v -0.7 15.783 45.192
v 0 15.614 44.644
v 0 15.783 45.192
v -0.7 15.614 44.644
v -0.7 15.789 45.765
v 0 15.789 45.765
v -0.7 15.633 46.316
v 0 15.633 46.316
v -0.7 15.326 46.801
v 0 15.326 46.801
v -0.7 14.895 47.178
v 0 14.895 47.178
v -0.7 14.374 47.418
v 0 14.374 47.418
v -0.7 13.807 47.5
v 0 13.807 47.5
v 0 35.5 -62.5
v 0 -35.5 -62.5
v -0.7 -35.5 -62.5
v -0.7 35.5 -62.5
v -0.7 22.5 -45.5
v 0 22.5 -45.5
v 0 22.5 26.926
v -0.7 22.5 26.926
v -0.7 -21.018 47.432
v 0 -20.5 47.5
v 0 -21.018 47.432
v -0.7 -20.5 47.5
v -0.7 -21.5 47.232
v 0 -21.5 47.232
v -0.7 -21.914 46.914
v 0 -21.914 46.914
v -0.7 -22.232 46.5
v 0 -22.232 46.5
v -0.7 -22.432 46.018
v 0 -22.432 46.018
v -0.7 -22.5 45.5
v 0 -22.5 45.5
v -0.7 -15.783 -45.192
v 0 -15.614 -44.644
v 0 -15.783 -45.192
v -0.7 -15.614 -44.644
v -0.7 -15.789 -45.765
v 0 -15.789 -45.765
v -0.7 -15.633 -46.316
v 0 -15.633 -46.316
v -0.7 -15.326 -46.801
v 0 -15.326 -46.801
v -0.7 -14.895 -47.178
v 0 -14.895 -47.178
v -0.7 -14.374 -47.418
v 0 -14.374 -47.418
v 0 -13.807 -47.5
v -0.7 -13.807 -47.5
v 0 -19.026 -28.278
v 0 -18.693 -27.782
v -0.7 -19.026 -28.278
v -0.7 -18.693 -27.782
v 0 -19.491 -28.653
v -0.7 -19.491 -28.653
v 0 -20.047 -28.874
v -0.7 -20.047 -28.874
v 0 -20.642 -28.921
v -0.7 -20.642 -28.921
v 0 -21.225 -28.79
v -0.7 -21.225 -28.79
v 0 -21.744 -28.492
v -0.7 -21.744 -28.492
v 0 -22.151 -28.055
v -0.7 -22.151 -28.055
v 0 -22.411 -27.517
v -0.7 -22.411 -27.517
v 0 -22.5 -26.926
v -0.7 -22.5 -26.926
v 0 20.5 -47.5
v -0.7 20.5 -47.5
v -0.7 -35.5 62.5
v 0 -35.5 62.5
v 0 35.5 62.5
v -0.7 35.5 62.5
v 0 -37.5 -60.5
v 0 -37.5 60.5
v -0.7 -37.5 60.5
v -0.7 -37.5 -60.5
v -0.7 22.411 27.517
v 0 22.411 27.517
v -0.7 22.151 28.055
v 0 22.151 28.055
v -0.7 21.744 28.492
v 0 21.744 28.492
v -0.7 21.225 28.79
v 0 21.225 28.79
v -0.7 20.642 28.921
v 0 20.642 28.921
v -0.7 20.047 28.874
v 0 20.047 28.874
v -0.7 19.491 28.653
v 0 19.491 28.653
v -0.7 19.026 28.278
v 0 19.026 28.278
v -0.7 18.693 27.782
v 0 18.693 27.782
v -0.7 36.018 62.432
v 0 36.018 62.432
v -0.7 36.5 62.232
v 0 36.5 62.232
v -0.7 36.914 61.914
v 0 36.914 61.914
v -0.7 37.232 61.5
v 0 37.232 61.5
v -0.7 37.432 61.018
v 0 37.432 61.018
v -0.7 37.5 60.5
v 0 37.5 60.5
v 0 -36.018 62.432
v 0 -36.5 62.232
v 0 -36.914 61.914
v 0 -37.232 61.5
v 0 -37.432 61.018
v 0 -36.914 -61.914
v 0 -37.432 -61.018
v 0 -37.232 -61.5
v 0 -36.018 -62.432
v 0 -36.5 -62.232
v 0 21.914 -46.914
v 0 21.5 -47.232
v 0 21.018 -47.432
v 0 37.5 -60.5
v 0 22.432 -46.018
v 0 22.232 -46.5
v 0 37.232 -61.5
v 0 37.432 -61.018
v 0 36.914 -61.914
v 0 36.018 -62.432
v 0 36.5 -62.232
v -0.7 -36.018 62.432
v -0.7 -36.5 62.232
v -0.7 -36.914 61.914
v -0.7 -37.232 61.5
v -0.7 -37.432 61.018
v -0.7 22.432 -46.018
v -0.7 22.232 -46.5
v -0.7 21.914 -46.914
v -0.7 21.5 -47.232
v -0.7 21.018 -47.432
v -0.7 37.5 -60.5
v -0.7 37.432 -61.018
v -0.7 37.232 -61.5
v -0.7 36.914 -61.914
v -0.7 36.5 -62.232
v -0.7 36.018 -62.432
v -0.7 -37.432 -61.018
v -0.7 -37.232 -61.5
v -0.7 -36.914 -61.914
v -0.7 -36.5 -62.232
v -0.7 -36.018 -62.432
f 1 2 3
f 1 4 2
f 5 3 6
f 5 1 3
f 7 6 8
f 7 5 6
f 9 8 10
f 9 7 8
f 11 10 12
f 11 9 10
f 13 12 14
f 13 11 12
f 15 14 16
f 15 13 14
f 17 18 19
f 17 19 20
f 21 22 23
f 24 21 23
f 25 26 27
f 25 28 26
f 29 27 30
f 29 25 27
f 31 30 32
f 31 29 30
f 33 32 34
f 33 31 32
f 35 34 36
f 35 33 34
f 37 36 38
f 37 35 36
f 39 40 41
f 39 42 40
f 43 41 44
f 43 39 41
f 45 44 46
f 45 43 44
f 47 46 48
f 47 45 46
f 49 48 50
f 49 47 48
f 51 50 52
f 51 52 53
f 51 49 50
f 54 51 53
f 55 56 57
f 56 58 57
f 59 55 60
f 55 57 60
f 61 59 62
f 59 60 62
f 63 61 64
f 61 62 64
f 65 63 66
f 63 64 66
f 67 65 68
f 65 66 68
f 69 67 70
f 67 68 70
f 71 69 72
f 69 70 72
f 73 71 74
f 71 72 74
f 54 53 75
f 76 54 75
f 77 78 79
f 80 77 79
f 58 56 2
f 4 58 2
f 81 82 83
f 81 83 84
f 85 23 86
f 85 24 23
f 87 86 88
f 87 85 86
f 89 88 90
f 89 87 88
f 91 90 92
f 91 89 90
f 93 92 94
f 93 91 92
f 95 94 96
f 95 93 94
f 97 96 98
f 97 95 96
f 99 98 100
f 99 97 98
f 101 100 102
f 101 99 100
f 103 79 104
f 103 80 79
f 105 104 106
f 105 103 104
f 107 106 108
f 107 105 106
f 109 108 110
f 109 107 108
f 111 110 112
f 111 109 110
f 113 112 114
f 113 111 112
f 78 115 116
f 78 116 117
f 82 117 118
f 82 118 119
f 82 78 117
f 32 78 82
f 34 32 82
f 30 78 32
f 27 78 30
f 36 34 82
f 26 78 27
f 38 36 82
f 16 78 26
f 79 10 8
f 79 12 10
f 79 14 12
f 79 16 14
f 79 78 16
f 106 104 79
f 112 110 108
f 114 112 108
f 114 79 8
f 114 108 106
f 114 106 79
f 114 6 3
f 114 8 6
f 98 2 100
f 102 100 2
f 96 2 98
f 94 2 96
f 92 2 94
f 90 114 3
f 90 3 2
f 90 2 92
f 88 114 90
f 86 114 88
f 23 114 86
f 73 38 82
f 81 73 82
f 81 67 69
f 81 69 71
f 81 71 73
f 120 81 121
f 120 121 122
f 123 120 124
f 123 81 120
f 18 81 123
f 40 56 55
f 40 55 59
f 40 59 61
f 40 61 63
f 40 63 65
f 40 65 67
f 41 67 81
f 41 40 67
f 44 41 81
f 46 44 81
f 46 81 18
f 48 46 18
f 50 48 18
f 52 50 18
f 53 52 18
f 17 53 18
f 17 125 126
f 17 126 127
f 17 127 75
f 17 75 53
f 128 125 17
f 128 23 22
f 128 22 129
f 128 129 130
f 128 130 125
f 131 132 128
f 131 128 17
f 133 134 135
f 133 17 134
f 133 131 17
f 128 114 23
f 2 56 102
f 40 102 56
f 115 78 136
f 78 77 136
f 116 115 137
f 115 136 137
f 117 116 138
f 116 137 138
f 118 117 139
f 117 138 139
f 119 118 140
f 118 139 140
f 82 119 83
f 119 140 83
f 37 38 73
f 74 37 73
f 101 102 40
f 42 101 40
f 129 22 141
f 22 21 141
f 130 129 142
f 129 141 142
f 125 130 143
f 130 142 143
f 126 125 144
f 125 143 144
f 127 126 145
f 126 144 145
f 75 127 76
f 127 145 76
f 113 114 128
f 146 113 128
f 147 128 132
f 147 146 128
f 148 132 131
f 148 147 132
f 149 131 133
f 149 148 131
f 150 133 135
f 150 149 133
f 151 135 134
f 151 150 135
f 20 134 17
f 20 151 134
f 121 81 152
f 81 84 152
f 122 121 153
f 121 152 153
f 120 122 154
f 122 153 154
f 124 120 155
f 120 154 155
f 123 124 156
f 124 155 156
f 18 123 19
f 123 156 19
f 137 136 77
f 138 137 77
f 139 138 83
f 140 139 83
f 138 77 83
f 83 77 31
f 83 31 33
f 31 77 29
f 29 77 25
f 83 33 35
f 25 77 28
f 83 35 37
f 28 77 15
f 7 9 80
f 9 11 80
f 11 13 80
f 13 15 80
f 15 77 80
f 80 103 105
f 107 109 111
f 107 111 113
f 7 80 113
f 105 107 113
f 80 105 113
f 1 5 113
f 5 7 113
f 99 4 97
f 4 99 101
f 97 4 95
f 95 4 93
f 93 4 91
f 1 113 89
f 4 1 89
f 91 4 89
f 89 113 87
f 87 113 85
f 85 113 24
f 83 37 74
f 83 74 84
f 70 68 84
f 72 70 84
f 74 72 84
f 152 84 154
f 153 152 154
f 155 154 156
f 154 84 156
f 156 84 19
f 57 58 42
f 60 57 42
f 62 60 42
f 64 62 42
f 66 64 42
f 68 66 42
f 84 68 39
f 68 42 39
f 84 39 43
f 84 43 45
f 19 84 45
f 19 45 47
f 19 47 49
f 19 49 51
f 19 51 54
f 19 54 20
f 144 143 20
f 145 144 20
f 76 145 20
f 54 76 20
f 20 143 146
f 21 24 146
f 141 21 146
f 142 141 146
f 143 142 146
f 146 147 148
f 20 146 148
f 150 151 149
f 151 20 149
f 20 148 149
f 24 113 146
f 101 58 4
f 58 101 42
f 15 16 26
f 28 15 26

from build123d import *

# Parameters (mm, degrees)
SKETCH1_W          = 125
SKETCH1_H          = 75
BASE_FLANGE1_DEPTH = 0.7
CUT_EXTRUDE1_DEPTH = 10
FILLET1_R          = 2


# Sheet-metal steps are written as plain solids
with BuildPart() as part:
    # Sketch1 → Base-Flange1 (new body)
    with BuildSketch(Plane(origin=(0, 0, 0), x_dir=(0, 0, -1), z_dir=(1, 0, 0))):
        Rectangle(SKETCH1_W, SKETCH1_H)
    extrude(amount=-BASE_FLANGE1_DEPTH)

    # Sketch10 → Cut-Extrude1 (cut)
    with BuildSketch(Plane(origin=(0, 0, 0), x_dir=(0, 0, -1), z_dir=(1, 0, 0))):
        Polygon((35.82011331, -22.5), (-47.5, 16.967422094), (-47.5, -22.5), align=None)
        Polygon((47.5, 22.5), (-35.82011331, 22.5), (47.5, -16.967422094), align=None)
    extrude(amount=-CUT_EXTRUDE1_DEPTH, mode=Mode.SUBTRACT)

    # Fillet1
    fillet1_edges = [part.edges().sort_by_distance(p)[0] for p in [
        (-0.35, 16.967422094, 47.5),
        (-0.35, -22.5, -35.82011331),
        (-0.35, -22.5, 47.5),
        (-0.35, 22.5, 35.82011331),
        (-0.35, 22.5, -47.5),
        (-0.35, -16.967422094, -47.5),
        (-0.35, -37.5, -62.5),
        (-0.35, -37.5, 62.5),
        (-0.35, 37.5, 62.5),
        (-0.35, 37.5, -62.5),
    ]]
    fillet(fillet1_edges, radius=FILLET1_R)


solid = part.part
